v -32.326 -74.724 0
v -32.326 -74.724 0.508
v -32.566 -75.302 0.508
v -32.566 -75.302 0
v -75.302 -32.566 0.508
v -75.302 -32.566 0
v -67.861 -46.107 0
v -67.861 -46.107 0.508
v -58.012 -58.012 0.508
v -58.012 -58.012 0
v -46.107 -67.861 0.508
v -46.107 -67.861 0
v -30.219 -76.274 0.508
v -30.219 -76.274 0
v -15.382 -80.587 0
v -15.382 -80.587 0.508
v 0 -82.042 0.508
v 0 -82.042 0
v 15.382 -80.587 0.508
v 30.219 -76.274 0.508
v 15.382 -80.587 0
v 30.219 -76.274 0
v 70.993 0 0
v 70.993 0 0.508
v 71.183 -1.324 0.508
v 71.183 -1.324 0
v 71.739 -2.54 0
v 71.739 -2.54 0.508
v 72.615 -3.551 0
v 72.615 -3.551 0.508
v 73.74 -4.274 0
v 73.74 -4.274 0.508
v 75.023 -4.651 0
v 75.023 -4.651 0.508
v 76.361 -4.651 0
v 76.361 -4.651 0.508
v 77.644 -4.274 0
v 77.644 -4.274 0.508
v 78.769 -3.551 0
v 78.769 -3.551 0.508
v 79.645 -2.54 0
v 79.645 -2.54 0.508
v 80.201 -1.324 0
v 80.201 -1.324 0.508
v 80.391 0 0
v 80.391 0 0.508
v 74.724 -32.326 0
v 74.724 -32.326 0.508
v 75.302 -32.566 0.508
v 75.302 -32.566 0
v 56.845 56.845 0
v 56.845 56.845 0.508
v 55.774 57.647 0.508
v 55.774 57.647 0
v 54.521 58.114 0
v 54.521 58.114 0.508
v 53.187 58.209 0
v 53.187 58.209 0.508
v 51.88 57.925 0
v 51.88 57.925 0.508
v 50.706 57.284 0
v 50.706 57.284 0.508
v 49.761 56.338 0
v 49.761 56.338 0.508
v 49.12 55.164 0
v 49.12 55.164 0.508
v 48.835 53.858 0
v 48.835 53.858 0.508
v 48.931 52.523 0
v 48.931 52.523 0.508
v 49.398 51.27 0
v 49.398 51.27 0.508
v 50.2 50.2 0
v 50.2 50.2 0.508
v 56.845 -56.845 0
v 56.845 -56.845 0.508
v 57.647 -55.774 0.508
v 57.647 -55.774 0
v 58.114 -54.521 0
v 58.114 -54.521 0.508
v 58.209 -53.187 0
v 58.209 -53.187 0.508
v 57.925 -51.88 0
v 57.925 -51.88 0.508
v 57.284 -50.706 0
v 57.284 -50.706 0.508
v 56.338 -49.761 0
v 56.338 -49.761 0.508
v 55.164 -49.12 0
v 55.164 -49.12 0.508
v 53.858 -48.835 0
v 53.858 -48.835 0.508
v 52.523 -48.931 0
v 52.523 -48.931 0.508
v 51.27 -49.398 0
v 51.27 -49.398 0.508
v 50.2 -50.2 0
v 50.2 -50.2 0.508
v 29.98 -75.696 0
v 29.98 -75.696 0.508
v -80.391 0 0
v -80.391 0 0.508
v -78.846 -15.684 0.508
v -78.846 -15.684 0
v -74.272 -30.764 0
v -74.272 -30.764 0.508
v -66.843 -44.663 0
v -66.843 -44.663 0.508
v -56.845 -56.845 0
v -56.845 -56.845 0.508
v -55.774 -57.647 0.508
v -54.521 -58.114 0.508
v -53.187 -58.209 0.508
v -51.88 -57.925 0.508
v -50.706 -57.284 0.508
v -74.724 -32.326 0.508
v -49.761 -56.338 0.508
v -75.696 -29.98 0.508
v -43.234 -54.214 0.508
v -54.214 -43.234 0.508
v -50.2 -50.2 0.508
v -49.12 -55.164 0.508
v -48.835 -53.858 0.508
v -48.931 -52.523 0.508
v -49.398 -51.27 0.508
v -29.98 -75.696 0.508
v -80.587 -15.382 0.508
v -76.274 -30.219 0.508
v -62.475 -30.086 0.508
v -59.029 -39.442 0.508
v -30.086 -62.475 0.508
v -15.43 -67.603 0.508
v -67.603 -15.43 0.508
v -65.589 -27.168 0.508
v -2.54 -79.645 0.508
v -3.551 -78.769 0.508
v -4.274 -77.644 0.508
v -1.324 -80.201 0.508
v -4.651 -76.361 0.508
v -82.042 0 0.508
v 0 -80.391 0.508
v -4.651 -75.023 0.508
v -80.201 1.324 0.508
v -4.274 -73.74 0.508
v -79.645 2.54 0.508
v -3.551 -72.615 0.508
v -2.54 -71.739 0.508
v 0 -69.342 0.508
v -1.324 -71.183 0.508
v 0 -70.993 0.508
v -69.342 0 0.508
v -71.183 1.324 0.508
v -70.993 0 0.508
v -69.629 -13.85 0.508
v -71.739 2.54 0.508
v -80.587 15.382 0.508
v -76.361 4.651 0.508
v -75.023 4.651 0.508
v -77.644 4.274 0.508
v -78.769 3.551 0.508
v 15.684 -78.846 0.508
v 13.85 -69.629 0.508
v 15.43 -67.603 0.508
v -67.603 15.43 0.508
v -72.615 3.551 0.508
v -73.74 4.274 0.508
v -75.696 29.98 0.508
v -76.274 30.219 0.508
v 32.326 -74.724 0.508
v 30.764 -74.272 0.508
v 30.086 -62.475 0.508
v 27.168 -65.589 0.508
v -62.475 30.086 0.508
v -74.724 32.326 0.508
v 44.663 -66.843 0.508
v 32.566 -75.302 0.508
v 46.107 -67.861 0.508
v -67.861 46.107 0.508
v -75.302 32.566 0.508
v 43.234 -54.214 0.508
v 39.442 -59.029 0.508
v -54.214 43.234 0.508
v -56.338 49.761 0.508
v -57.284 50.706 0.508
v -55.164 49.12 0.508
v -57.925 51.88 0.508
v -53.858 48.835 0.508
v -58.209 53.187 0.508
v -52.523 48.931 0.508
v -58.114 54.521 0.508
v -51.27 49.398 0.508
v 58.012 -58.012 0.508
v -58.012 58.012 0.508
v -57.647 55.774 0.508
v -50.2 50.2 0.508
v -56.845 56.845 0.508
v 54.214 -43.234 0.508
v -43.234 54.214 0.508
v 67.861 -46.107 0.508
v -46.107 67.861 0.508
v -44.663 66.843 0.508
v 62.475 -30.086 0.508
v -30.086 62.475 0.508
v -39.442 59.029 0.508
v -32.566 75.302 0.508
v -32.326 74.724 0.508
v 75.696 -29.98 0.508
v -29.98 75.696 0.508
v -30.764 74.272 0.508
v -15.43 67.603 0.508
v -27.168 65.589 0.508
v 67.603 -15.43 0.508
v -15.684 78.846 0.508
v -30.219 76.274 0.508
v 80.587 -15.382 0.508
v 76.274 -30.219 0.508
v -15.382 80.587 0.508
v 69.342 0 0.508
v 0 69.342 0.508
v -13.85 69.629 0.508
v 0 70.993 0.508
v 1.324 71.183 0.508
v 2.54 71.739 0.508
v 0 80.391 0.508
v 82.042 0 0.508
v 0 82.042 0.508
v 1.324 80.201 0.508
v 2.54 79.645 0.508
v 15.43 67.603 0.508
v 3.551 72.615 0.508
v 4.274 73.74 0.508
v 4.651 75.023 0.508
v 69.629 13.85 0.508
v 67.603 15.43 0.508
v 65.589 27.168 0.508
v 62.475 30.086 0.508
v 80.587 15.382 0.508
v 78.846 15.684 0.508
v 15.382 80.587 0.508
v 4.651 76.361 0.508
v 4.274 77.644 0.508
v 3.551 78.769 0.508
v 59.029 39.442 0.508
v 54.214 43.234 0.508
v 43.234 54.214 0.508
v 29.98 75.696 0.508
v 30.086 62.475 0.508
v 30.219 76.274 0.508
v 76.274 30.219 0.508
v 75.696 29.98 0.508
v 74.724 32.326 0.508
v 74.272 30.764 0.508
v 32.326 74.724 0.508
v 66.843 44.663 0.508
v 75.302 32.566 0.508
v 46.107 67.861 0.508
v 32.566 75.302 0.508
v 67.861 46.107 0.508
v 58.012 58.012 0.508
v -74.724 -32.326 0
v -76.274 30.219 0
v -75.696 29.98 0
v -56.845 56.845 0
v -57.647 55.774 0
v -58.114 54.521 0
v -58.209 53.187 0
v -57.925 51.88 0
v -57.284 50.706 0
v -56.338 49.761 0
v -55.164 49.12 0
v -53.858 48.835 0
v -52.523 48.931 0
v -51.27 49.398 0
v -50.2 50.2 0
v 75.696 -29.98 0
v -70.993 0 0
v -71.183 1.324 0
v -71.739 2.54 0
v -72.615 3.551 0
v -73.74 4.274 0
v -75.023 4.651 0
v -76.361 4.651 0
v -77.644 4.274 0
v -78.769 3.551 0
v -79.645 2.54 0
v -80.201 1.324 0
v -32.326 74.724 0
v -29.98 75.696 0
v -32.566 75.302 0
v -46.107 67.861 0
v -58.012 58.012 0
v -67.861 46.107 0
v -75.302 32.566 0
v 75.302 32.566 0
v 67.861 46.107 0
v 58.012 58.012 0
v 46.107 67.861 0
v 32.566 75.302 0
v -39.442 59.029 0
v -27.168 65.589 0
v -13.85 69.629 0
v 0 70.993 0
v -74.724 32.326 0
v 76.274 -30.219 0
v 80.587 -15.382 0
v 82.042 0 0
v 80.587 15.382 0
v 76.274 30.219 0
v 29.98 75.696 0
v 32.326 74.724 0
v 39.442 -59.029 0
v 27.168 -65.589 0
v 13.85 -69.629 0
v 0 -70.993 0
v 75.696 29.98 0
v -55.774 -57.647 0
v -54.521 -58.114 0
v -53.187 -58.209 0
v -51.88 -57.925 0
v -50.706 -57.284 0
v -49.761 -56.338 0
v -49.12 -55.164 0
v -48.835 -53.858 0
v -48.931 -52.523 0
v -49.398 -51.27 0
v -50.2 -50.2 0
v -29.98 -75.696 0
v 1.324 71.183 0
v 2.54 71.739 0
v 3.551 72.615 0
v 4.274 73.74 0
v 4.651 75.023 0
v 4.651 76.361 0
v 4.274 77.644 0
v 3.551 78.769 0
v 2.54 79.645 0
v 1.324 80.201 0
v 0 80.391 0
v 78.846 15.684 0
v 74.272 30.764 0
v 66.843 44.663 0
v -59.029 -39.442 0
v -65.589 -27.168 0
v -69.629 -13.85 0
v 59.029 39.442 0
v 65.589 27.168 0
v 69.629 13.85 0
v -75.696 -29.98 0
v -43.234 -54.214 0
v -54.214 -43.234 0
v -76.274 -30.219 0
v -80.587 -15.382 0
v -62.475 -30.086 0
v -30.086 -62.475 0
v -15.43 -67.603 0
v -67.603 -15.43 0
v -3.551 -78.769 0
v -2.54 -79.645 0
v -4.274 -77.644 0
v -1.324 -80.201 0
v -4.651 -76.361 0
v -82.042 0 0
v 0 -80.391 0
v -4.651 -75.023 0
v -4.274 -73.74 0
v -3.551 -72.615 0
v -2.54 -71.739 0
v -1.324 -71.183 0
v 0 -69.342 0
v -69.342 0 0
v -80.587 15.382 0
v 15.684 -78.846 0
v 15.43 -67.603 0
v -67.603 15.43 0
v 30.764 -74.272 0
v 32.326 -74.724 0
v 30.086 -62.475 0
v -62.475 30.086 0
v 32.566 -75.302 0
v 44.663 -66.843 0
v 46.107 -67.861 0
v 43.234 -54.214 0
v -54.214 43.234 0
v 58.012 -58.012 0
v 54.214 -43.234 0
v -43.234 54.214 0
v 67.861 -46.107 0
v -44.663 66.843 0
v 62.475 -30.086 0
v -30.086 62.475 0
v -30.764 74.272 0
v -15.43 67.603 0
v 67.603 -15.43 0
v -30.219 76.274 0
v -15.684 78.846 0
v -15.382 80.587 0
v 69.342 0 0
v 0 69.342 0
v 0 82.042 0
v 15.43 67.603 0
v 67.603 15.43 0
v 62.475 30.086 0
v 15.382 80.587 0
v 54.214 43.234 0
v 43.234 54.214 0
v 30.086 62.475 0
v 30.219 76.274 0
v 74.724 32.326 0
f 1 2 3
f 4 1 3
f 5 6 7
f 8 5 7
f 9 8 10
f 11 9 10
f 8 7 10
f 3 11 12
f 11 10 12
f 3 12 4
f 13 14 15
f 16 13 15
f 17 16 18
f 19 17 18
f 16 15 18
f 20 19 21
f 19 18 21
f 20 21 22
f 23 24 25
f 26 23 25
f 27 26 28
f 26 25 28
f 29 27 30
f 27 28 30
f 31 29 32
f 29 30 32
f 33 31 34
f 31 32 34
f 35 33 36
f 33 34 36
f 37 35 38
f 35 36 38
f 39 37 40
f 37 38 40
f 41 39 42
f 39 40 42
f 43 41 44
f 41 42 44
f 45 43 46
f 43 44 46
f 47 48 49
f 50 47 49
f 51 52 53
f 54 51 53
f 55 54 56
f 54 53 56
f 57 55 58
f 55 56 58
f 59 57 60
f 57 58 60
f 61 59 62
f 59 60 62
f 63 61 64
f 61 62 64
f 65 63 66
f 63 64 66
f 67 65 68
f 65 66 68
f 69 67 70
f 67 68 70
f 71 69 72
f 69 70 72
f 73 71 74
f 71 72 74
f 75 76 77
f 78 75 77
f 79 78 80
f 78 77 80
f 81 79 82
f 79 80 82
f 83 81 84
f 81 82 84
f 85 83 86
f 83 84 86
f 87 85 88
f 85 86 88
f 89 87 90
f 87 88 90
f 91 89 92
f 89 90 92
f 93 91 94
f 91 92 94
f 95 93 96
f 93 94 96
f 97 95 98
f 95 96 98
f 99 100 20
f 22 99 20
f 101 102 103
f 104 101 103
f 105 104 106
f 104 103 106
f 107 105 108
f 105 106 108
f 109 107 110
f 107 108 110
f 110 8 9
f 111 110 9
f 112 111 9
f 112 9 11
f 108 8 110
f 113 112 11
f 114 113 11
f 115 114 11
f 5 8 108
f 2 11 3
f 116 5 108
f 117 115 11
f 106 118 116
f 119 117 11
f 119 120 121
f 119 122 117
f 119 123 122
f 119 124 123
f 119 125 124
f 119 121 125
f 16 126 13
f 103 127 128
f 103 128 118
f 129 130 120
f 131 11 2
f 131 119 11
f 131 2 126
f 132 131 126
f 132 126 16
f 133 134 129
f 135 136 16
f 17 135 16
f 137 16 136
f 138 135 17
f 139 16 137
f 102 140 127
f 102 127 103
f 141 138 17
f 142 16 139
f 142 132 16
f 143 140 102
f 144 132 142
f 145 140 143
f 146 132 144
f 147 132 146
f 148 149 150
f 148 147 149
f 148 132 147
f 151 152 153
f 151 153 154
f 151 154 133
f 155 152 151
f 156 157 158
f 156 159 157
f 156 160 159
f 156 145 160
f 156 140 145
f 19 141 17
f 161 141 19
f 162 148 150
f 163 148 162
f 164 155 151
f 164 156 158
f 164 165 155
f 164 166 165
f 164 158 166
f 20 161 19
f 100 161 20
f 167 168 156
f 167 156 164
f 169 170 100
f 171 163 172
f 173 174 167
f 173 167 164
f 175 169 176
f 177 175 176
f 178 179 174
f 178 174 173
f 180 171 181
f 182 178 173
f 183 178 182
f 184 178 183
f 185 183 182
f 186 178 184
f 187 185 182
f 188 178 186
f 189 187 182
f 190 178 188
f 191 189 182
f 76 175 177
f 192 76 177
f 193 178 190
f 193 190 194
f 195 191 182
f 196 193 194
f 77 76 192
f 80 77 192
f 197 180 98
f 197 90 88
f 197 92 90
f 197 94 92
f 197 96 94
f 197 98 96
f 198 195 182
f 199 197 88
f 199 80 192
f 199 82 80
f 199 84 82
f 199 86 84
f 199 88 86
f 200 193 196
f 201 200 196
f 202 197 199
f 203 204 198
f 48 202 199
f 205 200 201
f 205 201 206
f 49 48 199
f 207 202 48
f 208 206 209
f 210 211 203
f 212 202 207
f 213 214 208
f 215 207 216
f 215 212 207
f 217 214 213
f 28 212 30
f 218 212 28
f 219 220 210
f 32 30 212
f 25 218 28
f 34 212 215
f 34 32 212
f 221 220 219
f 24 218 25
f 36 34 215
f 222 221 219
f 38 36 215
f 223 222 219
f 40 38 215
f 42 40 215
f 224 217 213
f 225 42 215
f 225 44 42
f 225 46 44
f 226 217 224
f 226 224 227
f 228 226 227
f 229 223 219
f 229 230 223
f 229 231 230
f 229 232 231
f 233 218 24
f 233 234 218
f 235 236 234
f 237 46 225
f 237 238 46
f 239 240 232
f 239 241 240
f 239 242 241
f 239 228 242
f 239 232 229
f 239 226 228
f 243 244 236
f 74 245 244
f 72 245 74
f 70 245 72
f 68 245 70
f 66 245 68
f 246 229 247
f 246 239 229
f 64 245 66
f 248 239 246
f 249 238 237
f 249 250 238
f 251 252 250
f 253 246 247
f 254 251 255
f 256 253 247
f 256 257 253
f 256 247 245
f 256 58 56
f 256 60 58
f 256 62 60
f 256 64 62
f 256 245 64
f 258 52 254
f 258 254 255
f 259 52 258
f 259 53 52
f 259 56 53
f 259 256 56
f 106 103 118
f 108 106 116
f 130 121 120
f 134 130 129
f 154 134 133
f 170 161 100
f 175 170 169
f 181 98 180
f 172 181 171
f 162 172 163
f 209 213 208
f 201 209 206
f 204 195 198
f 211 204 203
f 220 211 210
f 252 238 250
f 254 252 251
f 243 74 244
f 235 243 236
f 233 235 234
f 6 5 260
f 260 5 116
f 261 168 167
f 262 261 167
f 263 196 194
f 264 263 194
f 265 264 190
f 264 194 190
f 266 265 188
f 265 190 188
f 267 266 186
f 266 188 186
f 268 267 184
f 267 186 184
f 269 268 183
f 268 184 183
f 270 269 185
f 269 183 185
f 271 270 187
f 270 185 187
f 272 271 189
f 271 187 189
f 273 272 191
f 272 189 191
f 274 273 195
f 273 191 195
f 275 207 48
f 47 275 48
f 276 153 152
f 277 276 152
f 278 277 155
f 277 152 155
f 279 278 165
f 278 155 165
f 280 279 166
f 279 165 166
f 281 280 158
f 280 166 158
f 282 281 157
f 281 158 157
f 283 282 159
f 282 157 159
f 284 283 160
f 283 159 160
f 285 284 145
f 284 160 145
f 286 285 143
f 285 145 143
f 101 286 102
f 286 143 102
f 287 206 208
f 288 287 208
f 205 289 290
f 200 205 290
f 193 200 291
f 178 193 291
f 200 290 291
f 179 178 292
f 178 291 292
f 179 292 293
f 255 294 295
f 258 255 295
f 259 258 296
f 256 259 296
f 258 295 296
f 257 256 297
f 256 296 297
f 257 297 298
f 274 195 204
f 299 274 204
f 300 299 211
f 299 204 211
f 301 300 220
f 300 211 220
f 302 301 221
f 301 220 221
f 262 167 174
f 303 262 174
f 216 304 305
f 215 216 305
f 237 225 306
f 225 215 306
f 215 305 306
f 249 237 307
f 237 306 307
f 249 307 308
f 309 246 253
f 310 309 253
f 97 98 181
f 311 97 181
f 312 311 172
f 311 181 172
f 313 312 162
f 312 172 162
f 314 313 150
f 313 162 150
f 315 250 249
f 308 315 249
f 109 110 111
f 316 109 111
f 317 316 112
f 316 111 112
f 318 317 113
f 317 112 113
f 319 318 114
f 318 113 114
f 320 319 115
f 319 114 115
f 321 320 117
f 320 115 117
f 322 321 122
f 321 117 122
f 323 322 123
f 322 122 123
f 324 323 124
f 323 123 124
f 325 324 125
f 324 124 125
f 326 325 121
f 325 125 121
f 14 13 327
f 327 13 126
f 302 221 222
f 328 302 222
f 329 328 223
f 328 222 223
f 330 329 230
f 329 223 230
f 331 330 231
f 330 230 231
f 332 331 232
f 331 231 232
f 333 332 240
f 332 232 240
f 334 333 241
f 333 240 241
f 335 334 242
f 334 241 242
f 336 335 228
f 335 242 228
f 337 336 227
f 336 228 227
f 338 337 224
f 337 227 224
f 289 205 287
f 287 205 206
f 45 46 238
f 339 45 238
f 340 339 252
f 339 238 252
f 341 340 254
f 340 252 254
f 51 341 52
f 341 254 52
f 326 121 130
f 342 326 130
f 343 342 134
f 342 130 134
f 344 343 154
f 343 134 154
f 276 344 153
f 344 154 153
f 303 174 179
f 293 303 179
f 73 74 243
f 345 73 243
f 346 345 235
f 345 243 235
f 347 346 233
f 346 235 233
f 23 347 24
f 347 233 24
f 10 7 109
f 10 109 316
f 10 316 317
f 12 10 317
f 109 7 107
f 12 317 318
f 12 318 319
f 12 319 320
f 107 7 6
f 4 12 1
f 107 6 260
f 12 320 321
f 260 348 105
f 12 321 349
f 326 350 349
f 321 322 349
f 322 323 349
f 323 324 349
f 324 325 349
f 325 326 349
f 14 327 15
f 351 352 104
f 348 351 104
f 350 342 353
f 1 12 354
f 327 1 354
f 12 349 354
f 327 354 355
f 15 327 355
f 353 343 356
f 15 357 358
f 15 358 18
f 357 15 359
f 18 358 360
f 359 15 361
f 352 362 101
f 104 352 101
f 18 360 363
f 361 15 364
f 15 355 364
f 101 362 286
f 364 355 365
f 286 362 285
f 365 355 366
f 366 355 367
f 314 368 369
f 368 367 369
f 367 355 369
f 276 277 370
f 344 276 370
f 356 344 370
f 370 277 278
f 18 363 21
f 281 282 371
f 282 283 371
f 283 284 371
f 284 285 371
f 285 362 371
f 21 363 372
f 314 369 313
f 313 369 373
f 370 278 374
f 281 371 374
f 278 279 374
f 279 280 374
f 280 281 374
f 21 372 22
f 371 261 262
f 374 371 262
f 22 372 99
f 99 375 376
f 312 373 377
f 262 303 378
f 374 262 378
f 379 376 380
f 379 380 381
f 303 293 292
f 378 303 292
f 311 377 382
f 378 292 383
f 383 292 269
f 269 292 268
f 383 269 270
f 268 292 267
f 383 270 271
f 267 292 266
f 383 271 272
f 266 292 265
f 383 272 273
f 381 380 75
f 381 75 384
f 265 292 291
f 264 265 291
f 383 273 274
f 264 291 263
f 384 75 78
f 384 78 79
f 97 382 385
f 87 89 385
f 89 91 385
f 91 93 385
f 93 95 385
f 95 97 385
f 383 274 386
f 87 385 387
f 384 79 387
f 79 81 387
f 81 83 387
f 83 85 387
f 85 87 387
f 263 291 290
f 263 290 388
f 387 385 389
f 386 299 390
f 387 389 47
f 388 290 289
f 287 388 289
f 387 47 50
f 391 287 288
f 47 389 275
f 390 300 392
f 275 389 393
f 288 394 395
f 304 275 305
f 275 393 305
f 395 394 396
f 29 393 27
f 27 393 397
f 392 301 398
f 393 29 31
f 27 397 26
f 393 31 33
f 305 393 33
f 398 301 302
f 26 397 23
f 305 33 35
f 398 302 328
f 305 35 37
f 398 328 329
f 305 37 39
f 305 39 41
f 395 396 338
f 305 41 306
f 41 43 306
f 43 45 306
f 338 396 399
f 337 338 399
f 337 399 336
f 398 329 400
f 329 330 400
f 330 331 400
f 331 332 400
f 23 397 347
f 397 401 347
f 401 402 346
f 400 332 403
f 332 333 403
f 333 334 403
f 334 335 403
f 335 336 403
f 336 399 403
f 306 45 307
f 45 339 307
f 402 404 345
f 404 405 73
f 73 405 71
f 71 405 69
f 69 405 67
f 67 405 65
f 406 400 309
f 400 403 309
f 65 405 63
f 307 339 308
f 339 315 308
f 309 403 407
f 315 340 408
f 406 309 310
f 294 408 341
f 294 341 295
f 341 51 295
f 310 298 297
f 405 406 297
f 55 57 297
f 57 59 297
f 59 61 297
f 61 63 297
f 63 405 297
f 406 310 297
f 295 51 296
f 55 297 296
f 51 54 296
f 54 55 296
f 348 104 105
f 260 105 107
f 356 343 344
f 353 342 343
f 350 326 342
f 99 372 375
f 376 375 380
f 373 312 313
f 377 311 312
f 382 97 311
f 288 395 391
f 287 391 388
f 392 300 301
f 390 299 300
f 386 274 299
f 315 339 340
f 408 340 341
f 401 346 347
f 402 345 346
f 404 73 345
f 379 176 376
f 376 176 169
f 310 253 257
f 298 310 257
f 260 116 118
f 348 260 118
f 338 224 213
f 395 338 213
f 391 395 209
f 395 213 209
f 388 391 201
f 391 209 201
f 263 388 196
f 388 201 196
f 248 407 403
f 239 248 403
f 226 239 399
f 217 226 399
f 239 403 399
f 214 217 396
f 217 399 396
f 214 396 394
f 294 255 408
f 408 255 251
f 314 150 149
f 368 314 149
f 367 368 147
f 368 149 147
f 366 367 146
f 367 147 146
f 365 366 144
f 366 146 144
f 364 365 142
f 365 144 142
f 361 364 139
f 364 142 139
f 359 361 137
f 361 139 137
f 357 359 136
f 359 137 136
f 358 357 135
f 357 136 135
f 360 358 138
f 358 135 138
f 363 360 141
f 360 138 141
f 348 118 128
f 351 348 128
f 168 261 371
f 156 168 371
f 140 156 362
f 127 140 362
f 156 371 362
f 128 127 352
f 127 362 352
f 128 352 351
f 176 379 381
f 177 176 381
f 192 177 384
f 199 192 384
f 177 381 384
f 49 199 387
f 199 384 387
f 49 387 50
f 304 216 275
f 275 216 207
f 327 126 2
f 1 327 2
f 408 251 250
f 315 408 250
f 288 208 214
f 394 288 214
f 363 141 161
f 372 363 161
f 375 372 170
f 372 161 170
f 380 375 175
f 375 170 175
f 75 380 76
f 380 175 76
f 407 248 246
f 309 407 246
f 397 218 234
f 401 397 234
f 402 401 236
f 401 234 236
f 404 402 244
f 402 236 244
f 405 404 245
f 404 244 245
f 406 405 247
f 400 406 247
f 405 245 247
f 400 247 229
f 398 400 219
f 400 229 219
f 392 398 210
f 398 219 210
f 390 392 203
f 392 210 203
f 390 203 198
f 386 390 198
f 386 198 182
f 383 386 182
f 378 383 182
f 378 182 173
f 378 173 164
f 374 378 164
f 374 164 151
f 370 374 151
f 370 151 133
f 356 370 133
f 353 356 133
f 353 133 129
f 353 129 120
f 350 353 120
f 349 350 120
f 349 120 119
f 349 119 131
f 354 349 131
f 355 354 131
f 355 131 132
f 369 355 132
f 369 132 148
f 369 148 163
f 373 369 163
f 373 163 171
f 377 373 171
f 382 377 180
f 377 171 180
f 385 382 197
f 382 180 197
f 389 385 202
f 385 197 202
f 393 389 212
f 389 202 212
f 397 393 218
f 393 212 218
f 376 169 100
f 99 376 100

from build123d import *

# Parameters (mm, degrees)
SKETCH4_R           = 82.042
BOSS_EXTRUDE2_DEPTH = 0.508
SKETCH5_R           = 69.342
CUT_EXTRUDE5_DEPTH  = 1.508
CUT_EXTRUDE6_DEPTH  = 1.508
CUT_EXTRUDE11_DEPTH = 1.508


with BuildPart() as part:
    # Sketch4 → Boss-Extrude2 (new body)
    with BuildSketch(Plane.XY):
        Circle(SKETCH4_R)
    extrude(amount=BOSS_EXTRUDE2_DEPTH)

    # Sketch5 → Cut-Extrude5 (cut, through all)
    with BuildSketch(Plane.XY.offset(0.508)):
        Circle(SKETCH5_R)
    extrude(amount=-CUT_EXTRUDE5_DEPTH, mode=Mode.SUBTRACT)

    # Sketch6 → Cut-Extrude6 (cut, through all)
    with BuildSketch(Plane.XY.offset(0.508)):
        with BuildLine():
            ThreePointArc((56.845021902, 56.845020591), (50.199631755, 56.845021285), (50.199632296, 50.199631138))
            ThreePointArc((50.199632296, 50.199631138), (65.588979611, 27.167845011), (70.993, 1.03e-06))
            ThreePointArc((70.993, 1.03e-06), (75.692000068, -4.699), (80.391, 1.166e-06))
            ThreePointArc((80.391, 1.166e-06), (74.271599452, 30.764303922), (56.845021902, 56.845020591))
        make_face()
        with BuildLine():
            ThreePointArc((56.845020591, -56.845021902), (56.845021285, -50.199631755), (50.199631138, -50.199632296))
            ThreePointArc((50.199631138, -50.199632296), (27.167845011, -65.588979611), (1.03e-06, -70.993))
            ThreePointArc((1.03e-06, -70.993), (-4.699, -75.692000068), (1.166e-06, -80.391))
            ThreePointArc((1.166e-06, -80.391), (30.764303922, -74.271599452), (56.845020591, -56.845021902))
        make_face()
        with BuildLine():
            ThreePointArc((-56.845021902, -56.845020591), (-50.199631755, -56.845021285), (-50.199632296, -50.199631138))
            ThreePointArc((-50.199632296, -50.199631138), (-65.588979611, -27.167845011), (-70.993, -1.03e-06))
            ThreePointArc((-70.993, -1.03e-06), (-75.692000068, 4.699), (-80.391, -1.166e-06))
            ThreePointArc((-80.391, -1.166e-06), (-74.271599452, -30.764303922), (-56.845021902, -56.845020591))
        make_face()
        with BuildLine():
            ThreePointArc((-56.845020591, 56.845021902), (-56.845021285, 50.199631755), (-50.199631138, 50.199632296))
            ThreePointArc((-50.199631138, 50.199632296), (-27.167845011, 65.588979611), (-1.03e-06, 70.993))
            ThreePointArc((-1.03e-06, 70.993), (4.699, 75.692000068), (-1.166e-06, 80.391))
            ThreePointArc((-1.166e-06, 80.391), (-30.764303922, 74.271599452), (-56.845020591, 56.845021902))
        make_face()
    extrude(amount=-CUT_EXTRUDE6_DEPTH, mode=Mode.SUBTRACT)

    # Sketch8 → Cut-Extrude11 (cut, through all)
    with BuildSketch(Plane.XY.offset(0.508)):
        Polygon((76.869596069, 30.465791131), (75.89758015, 32.812445144), (74.724253144, 32.326437185), (75.696269062, 29.979783172), align=None)
        Polygon((-30.465791131, 76.869596069), (-32.812445144, 75.89758015), (-32.326437185, 74.724253144), (-29.979783172, 75.696269062), align=None)
        Polygon((-75.89758015, 32.812445144), (-76.869596069, 30.465791131), (-75.696269062, 29.979783172), (-74.724253144, 32.326437185), align=None)
        Polygon((-76.869596069, -30.465791131), (-75.89758015, -32.812445144), (-74.724253144, -32.326437185), (-75.696269062, -29.979783172), align=None)
        Polygon((-32.812445144, -75.89758015), (-30.465791131, -76.869596069), (-29.979783172, -75.696269062), (-32.326437185, -74.724253144), align=None)
        Polygon((30.465791131, -76.869596069), (32.812445144, -75.89758015), (32.326437185, -74.724253144), (29.979783172, -75.696269062), align=None)
        Polygon((75.89758015, -32.812445144), (76.869596069, -30.465791131), (75.696269062, -29.979783172), (74.724253144, -32.326437185), align=None)
        Polygon((32.812445144, 75.89758015), (30.465791131, 76.869596069), (29.979783172, 75.696269062), (32.326437185, 74.724253144), align=None)
    extrude(amount=-CUT_EXTRUDE11_DEPTH, mode=Mode.SUBTRACT)


solid = part.part
